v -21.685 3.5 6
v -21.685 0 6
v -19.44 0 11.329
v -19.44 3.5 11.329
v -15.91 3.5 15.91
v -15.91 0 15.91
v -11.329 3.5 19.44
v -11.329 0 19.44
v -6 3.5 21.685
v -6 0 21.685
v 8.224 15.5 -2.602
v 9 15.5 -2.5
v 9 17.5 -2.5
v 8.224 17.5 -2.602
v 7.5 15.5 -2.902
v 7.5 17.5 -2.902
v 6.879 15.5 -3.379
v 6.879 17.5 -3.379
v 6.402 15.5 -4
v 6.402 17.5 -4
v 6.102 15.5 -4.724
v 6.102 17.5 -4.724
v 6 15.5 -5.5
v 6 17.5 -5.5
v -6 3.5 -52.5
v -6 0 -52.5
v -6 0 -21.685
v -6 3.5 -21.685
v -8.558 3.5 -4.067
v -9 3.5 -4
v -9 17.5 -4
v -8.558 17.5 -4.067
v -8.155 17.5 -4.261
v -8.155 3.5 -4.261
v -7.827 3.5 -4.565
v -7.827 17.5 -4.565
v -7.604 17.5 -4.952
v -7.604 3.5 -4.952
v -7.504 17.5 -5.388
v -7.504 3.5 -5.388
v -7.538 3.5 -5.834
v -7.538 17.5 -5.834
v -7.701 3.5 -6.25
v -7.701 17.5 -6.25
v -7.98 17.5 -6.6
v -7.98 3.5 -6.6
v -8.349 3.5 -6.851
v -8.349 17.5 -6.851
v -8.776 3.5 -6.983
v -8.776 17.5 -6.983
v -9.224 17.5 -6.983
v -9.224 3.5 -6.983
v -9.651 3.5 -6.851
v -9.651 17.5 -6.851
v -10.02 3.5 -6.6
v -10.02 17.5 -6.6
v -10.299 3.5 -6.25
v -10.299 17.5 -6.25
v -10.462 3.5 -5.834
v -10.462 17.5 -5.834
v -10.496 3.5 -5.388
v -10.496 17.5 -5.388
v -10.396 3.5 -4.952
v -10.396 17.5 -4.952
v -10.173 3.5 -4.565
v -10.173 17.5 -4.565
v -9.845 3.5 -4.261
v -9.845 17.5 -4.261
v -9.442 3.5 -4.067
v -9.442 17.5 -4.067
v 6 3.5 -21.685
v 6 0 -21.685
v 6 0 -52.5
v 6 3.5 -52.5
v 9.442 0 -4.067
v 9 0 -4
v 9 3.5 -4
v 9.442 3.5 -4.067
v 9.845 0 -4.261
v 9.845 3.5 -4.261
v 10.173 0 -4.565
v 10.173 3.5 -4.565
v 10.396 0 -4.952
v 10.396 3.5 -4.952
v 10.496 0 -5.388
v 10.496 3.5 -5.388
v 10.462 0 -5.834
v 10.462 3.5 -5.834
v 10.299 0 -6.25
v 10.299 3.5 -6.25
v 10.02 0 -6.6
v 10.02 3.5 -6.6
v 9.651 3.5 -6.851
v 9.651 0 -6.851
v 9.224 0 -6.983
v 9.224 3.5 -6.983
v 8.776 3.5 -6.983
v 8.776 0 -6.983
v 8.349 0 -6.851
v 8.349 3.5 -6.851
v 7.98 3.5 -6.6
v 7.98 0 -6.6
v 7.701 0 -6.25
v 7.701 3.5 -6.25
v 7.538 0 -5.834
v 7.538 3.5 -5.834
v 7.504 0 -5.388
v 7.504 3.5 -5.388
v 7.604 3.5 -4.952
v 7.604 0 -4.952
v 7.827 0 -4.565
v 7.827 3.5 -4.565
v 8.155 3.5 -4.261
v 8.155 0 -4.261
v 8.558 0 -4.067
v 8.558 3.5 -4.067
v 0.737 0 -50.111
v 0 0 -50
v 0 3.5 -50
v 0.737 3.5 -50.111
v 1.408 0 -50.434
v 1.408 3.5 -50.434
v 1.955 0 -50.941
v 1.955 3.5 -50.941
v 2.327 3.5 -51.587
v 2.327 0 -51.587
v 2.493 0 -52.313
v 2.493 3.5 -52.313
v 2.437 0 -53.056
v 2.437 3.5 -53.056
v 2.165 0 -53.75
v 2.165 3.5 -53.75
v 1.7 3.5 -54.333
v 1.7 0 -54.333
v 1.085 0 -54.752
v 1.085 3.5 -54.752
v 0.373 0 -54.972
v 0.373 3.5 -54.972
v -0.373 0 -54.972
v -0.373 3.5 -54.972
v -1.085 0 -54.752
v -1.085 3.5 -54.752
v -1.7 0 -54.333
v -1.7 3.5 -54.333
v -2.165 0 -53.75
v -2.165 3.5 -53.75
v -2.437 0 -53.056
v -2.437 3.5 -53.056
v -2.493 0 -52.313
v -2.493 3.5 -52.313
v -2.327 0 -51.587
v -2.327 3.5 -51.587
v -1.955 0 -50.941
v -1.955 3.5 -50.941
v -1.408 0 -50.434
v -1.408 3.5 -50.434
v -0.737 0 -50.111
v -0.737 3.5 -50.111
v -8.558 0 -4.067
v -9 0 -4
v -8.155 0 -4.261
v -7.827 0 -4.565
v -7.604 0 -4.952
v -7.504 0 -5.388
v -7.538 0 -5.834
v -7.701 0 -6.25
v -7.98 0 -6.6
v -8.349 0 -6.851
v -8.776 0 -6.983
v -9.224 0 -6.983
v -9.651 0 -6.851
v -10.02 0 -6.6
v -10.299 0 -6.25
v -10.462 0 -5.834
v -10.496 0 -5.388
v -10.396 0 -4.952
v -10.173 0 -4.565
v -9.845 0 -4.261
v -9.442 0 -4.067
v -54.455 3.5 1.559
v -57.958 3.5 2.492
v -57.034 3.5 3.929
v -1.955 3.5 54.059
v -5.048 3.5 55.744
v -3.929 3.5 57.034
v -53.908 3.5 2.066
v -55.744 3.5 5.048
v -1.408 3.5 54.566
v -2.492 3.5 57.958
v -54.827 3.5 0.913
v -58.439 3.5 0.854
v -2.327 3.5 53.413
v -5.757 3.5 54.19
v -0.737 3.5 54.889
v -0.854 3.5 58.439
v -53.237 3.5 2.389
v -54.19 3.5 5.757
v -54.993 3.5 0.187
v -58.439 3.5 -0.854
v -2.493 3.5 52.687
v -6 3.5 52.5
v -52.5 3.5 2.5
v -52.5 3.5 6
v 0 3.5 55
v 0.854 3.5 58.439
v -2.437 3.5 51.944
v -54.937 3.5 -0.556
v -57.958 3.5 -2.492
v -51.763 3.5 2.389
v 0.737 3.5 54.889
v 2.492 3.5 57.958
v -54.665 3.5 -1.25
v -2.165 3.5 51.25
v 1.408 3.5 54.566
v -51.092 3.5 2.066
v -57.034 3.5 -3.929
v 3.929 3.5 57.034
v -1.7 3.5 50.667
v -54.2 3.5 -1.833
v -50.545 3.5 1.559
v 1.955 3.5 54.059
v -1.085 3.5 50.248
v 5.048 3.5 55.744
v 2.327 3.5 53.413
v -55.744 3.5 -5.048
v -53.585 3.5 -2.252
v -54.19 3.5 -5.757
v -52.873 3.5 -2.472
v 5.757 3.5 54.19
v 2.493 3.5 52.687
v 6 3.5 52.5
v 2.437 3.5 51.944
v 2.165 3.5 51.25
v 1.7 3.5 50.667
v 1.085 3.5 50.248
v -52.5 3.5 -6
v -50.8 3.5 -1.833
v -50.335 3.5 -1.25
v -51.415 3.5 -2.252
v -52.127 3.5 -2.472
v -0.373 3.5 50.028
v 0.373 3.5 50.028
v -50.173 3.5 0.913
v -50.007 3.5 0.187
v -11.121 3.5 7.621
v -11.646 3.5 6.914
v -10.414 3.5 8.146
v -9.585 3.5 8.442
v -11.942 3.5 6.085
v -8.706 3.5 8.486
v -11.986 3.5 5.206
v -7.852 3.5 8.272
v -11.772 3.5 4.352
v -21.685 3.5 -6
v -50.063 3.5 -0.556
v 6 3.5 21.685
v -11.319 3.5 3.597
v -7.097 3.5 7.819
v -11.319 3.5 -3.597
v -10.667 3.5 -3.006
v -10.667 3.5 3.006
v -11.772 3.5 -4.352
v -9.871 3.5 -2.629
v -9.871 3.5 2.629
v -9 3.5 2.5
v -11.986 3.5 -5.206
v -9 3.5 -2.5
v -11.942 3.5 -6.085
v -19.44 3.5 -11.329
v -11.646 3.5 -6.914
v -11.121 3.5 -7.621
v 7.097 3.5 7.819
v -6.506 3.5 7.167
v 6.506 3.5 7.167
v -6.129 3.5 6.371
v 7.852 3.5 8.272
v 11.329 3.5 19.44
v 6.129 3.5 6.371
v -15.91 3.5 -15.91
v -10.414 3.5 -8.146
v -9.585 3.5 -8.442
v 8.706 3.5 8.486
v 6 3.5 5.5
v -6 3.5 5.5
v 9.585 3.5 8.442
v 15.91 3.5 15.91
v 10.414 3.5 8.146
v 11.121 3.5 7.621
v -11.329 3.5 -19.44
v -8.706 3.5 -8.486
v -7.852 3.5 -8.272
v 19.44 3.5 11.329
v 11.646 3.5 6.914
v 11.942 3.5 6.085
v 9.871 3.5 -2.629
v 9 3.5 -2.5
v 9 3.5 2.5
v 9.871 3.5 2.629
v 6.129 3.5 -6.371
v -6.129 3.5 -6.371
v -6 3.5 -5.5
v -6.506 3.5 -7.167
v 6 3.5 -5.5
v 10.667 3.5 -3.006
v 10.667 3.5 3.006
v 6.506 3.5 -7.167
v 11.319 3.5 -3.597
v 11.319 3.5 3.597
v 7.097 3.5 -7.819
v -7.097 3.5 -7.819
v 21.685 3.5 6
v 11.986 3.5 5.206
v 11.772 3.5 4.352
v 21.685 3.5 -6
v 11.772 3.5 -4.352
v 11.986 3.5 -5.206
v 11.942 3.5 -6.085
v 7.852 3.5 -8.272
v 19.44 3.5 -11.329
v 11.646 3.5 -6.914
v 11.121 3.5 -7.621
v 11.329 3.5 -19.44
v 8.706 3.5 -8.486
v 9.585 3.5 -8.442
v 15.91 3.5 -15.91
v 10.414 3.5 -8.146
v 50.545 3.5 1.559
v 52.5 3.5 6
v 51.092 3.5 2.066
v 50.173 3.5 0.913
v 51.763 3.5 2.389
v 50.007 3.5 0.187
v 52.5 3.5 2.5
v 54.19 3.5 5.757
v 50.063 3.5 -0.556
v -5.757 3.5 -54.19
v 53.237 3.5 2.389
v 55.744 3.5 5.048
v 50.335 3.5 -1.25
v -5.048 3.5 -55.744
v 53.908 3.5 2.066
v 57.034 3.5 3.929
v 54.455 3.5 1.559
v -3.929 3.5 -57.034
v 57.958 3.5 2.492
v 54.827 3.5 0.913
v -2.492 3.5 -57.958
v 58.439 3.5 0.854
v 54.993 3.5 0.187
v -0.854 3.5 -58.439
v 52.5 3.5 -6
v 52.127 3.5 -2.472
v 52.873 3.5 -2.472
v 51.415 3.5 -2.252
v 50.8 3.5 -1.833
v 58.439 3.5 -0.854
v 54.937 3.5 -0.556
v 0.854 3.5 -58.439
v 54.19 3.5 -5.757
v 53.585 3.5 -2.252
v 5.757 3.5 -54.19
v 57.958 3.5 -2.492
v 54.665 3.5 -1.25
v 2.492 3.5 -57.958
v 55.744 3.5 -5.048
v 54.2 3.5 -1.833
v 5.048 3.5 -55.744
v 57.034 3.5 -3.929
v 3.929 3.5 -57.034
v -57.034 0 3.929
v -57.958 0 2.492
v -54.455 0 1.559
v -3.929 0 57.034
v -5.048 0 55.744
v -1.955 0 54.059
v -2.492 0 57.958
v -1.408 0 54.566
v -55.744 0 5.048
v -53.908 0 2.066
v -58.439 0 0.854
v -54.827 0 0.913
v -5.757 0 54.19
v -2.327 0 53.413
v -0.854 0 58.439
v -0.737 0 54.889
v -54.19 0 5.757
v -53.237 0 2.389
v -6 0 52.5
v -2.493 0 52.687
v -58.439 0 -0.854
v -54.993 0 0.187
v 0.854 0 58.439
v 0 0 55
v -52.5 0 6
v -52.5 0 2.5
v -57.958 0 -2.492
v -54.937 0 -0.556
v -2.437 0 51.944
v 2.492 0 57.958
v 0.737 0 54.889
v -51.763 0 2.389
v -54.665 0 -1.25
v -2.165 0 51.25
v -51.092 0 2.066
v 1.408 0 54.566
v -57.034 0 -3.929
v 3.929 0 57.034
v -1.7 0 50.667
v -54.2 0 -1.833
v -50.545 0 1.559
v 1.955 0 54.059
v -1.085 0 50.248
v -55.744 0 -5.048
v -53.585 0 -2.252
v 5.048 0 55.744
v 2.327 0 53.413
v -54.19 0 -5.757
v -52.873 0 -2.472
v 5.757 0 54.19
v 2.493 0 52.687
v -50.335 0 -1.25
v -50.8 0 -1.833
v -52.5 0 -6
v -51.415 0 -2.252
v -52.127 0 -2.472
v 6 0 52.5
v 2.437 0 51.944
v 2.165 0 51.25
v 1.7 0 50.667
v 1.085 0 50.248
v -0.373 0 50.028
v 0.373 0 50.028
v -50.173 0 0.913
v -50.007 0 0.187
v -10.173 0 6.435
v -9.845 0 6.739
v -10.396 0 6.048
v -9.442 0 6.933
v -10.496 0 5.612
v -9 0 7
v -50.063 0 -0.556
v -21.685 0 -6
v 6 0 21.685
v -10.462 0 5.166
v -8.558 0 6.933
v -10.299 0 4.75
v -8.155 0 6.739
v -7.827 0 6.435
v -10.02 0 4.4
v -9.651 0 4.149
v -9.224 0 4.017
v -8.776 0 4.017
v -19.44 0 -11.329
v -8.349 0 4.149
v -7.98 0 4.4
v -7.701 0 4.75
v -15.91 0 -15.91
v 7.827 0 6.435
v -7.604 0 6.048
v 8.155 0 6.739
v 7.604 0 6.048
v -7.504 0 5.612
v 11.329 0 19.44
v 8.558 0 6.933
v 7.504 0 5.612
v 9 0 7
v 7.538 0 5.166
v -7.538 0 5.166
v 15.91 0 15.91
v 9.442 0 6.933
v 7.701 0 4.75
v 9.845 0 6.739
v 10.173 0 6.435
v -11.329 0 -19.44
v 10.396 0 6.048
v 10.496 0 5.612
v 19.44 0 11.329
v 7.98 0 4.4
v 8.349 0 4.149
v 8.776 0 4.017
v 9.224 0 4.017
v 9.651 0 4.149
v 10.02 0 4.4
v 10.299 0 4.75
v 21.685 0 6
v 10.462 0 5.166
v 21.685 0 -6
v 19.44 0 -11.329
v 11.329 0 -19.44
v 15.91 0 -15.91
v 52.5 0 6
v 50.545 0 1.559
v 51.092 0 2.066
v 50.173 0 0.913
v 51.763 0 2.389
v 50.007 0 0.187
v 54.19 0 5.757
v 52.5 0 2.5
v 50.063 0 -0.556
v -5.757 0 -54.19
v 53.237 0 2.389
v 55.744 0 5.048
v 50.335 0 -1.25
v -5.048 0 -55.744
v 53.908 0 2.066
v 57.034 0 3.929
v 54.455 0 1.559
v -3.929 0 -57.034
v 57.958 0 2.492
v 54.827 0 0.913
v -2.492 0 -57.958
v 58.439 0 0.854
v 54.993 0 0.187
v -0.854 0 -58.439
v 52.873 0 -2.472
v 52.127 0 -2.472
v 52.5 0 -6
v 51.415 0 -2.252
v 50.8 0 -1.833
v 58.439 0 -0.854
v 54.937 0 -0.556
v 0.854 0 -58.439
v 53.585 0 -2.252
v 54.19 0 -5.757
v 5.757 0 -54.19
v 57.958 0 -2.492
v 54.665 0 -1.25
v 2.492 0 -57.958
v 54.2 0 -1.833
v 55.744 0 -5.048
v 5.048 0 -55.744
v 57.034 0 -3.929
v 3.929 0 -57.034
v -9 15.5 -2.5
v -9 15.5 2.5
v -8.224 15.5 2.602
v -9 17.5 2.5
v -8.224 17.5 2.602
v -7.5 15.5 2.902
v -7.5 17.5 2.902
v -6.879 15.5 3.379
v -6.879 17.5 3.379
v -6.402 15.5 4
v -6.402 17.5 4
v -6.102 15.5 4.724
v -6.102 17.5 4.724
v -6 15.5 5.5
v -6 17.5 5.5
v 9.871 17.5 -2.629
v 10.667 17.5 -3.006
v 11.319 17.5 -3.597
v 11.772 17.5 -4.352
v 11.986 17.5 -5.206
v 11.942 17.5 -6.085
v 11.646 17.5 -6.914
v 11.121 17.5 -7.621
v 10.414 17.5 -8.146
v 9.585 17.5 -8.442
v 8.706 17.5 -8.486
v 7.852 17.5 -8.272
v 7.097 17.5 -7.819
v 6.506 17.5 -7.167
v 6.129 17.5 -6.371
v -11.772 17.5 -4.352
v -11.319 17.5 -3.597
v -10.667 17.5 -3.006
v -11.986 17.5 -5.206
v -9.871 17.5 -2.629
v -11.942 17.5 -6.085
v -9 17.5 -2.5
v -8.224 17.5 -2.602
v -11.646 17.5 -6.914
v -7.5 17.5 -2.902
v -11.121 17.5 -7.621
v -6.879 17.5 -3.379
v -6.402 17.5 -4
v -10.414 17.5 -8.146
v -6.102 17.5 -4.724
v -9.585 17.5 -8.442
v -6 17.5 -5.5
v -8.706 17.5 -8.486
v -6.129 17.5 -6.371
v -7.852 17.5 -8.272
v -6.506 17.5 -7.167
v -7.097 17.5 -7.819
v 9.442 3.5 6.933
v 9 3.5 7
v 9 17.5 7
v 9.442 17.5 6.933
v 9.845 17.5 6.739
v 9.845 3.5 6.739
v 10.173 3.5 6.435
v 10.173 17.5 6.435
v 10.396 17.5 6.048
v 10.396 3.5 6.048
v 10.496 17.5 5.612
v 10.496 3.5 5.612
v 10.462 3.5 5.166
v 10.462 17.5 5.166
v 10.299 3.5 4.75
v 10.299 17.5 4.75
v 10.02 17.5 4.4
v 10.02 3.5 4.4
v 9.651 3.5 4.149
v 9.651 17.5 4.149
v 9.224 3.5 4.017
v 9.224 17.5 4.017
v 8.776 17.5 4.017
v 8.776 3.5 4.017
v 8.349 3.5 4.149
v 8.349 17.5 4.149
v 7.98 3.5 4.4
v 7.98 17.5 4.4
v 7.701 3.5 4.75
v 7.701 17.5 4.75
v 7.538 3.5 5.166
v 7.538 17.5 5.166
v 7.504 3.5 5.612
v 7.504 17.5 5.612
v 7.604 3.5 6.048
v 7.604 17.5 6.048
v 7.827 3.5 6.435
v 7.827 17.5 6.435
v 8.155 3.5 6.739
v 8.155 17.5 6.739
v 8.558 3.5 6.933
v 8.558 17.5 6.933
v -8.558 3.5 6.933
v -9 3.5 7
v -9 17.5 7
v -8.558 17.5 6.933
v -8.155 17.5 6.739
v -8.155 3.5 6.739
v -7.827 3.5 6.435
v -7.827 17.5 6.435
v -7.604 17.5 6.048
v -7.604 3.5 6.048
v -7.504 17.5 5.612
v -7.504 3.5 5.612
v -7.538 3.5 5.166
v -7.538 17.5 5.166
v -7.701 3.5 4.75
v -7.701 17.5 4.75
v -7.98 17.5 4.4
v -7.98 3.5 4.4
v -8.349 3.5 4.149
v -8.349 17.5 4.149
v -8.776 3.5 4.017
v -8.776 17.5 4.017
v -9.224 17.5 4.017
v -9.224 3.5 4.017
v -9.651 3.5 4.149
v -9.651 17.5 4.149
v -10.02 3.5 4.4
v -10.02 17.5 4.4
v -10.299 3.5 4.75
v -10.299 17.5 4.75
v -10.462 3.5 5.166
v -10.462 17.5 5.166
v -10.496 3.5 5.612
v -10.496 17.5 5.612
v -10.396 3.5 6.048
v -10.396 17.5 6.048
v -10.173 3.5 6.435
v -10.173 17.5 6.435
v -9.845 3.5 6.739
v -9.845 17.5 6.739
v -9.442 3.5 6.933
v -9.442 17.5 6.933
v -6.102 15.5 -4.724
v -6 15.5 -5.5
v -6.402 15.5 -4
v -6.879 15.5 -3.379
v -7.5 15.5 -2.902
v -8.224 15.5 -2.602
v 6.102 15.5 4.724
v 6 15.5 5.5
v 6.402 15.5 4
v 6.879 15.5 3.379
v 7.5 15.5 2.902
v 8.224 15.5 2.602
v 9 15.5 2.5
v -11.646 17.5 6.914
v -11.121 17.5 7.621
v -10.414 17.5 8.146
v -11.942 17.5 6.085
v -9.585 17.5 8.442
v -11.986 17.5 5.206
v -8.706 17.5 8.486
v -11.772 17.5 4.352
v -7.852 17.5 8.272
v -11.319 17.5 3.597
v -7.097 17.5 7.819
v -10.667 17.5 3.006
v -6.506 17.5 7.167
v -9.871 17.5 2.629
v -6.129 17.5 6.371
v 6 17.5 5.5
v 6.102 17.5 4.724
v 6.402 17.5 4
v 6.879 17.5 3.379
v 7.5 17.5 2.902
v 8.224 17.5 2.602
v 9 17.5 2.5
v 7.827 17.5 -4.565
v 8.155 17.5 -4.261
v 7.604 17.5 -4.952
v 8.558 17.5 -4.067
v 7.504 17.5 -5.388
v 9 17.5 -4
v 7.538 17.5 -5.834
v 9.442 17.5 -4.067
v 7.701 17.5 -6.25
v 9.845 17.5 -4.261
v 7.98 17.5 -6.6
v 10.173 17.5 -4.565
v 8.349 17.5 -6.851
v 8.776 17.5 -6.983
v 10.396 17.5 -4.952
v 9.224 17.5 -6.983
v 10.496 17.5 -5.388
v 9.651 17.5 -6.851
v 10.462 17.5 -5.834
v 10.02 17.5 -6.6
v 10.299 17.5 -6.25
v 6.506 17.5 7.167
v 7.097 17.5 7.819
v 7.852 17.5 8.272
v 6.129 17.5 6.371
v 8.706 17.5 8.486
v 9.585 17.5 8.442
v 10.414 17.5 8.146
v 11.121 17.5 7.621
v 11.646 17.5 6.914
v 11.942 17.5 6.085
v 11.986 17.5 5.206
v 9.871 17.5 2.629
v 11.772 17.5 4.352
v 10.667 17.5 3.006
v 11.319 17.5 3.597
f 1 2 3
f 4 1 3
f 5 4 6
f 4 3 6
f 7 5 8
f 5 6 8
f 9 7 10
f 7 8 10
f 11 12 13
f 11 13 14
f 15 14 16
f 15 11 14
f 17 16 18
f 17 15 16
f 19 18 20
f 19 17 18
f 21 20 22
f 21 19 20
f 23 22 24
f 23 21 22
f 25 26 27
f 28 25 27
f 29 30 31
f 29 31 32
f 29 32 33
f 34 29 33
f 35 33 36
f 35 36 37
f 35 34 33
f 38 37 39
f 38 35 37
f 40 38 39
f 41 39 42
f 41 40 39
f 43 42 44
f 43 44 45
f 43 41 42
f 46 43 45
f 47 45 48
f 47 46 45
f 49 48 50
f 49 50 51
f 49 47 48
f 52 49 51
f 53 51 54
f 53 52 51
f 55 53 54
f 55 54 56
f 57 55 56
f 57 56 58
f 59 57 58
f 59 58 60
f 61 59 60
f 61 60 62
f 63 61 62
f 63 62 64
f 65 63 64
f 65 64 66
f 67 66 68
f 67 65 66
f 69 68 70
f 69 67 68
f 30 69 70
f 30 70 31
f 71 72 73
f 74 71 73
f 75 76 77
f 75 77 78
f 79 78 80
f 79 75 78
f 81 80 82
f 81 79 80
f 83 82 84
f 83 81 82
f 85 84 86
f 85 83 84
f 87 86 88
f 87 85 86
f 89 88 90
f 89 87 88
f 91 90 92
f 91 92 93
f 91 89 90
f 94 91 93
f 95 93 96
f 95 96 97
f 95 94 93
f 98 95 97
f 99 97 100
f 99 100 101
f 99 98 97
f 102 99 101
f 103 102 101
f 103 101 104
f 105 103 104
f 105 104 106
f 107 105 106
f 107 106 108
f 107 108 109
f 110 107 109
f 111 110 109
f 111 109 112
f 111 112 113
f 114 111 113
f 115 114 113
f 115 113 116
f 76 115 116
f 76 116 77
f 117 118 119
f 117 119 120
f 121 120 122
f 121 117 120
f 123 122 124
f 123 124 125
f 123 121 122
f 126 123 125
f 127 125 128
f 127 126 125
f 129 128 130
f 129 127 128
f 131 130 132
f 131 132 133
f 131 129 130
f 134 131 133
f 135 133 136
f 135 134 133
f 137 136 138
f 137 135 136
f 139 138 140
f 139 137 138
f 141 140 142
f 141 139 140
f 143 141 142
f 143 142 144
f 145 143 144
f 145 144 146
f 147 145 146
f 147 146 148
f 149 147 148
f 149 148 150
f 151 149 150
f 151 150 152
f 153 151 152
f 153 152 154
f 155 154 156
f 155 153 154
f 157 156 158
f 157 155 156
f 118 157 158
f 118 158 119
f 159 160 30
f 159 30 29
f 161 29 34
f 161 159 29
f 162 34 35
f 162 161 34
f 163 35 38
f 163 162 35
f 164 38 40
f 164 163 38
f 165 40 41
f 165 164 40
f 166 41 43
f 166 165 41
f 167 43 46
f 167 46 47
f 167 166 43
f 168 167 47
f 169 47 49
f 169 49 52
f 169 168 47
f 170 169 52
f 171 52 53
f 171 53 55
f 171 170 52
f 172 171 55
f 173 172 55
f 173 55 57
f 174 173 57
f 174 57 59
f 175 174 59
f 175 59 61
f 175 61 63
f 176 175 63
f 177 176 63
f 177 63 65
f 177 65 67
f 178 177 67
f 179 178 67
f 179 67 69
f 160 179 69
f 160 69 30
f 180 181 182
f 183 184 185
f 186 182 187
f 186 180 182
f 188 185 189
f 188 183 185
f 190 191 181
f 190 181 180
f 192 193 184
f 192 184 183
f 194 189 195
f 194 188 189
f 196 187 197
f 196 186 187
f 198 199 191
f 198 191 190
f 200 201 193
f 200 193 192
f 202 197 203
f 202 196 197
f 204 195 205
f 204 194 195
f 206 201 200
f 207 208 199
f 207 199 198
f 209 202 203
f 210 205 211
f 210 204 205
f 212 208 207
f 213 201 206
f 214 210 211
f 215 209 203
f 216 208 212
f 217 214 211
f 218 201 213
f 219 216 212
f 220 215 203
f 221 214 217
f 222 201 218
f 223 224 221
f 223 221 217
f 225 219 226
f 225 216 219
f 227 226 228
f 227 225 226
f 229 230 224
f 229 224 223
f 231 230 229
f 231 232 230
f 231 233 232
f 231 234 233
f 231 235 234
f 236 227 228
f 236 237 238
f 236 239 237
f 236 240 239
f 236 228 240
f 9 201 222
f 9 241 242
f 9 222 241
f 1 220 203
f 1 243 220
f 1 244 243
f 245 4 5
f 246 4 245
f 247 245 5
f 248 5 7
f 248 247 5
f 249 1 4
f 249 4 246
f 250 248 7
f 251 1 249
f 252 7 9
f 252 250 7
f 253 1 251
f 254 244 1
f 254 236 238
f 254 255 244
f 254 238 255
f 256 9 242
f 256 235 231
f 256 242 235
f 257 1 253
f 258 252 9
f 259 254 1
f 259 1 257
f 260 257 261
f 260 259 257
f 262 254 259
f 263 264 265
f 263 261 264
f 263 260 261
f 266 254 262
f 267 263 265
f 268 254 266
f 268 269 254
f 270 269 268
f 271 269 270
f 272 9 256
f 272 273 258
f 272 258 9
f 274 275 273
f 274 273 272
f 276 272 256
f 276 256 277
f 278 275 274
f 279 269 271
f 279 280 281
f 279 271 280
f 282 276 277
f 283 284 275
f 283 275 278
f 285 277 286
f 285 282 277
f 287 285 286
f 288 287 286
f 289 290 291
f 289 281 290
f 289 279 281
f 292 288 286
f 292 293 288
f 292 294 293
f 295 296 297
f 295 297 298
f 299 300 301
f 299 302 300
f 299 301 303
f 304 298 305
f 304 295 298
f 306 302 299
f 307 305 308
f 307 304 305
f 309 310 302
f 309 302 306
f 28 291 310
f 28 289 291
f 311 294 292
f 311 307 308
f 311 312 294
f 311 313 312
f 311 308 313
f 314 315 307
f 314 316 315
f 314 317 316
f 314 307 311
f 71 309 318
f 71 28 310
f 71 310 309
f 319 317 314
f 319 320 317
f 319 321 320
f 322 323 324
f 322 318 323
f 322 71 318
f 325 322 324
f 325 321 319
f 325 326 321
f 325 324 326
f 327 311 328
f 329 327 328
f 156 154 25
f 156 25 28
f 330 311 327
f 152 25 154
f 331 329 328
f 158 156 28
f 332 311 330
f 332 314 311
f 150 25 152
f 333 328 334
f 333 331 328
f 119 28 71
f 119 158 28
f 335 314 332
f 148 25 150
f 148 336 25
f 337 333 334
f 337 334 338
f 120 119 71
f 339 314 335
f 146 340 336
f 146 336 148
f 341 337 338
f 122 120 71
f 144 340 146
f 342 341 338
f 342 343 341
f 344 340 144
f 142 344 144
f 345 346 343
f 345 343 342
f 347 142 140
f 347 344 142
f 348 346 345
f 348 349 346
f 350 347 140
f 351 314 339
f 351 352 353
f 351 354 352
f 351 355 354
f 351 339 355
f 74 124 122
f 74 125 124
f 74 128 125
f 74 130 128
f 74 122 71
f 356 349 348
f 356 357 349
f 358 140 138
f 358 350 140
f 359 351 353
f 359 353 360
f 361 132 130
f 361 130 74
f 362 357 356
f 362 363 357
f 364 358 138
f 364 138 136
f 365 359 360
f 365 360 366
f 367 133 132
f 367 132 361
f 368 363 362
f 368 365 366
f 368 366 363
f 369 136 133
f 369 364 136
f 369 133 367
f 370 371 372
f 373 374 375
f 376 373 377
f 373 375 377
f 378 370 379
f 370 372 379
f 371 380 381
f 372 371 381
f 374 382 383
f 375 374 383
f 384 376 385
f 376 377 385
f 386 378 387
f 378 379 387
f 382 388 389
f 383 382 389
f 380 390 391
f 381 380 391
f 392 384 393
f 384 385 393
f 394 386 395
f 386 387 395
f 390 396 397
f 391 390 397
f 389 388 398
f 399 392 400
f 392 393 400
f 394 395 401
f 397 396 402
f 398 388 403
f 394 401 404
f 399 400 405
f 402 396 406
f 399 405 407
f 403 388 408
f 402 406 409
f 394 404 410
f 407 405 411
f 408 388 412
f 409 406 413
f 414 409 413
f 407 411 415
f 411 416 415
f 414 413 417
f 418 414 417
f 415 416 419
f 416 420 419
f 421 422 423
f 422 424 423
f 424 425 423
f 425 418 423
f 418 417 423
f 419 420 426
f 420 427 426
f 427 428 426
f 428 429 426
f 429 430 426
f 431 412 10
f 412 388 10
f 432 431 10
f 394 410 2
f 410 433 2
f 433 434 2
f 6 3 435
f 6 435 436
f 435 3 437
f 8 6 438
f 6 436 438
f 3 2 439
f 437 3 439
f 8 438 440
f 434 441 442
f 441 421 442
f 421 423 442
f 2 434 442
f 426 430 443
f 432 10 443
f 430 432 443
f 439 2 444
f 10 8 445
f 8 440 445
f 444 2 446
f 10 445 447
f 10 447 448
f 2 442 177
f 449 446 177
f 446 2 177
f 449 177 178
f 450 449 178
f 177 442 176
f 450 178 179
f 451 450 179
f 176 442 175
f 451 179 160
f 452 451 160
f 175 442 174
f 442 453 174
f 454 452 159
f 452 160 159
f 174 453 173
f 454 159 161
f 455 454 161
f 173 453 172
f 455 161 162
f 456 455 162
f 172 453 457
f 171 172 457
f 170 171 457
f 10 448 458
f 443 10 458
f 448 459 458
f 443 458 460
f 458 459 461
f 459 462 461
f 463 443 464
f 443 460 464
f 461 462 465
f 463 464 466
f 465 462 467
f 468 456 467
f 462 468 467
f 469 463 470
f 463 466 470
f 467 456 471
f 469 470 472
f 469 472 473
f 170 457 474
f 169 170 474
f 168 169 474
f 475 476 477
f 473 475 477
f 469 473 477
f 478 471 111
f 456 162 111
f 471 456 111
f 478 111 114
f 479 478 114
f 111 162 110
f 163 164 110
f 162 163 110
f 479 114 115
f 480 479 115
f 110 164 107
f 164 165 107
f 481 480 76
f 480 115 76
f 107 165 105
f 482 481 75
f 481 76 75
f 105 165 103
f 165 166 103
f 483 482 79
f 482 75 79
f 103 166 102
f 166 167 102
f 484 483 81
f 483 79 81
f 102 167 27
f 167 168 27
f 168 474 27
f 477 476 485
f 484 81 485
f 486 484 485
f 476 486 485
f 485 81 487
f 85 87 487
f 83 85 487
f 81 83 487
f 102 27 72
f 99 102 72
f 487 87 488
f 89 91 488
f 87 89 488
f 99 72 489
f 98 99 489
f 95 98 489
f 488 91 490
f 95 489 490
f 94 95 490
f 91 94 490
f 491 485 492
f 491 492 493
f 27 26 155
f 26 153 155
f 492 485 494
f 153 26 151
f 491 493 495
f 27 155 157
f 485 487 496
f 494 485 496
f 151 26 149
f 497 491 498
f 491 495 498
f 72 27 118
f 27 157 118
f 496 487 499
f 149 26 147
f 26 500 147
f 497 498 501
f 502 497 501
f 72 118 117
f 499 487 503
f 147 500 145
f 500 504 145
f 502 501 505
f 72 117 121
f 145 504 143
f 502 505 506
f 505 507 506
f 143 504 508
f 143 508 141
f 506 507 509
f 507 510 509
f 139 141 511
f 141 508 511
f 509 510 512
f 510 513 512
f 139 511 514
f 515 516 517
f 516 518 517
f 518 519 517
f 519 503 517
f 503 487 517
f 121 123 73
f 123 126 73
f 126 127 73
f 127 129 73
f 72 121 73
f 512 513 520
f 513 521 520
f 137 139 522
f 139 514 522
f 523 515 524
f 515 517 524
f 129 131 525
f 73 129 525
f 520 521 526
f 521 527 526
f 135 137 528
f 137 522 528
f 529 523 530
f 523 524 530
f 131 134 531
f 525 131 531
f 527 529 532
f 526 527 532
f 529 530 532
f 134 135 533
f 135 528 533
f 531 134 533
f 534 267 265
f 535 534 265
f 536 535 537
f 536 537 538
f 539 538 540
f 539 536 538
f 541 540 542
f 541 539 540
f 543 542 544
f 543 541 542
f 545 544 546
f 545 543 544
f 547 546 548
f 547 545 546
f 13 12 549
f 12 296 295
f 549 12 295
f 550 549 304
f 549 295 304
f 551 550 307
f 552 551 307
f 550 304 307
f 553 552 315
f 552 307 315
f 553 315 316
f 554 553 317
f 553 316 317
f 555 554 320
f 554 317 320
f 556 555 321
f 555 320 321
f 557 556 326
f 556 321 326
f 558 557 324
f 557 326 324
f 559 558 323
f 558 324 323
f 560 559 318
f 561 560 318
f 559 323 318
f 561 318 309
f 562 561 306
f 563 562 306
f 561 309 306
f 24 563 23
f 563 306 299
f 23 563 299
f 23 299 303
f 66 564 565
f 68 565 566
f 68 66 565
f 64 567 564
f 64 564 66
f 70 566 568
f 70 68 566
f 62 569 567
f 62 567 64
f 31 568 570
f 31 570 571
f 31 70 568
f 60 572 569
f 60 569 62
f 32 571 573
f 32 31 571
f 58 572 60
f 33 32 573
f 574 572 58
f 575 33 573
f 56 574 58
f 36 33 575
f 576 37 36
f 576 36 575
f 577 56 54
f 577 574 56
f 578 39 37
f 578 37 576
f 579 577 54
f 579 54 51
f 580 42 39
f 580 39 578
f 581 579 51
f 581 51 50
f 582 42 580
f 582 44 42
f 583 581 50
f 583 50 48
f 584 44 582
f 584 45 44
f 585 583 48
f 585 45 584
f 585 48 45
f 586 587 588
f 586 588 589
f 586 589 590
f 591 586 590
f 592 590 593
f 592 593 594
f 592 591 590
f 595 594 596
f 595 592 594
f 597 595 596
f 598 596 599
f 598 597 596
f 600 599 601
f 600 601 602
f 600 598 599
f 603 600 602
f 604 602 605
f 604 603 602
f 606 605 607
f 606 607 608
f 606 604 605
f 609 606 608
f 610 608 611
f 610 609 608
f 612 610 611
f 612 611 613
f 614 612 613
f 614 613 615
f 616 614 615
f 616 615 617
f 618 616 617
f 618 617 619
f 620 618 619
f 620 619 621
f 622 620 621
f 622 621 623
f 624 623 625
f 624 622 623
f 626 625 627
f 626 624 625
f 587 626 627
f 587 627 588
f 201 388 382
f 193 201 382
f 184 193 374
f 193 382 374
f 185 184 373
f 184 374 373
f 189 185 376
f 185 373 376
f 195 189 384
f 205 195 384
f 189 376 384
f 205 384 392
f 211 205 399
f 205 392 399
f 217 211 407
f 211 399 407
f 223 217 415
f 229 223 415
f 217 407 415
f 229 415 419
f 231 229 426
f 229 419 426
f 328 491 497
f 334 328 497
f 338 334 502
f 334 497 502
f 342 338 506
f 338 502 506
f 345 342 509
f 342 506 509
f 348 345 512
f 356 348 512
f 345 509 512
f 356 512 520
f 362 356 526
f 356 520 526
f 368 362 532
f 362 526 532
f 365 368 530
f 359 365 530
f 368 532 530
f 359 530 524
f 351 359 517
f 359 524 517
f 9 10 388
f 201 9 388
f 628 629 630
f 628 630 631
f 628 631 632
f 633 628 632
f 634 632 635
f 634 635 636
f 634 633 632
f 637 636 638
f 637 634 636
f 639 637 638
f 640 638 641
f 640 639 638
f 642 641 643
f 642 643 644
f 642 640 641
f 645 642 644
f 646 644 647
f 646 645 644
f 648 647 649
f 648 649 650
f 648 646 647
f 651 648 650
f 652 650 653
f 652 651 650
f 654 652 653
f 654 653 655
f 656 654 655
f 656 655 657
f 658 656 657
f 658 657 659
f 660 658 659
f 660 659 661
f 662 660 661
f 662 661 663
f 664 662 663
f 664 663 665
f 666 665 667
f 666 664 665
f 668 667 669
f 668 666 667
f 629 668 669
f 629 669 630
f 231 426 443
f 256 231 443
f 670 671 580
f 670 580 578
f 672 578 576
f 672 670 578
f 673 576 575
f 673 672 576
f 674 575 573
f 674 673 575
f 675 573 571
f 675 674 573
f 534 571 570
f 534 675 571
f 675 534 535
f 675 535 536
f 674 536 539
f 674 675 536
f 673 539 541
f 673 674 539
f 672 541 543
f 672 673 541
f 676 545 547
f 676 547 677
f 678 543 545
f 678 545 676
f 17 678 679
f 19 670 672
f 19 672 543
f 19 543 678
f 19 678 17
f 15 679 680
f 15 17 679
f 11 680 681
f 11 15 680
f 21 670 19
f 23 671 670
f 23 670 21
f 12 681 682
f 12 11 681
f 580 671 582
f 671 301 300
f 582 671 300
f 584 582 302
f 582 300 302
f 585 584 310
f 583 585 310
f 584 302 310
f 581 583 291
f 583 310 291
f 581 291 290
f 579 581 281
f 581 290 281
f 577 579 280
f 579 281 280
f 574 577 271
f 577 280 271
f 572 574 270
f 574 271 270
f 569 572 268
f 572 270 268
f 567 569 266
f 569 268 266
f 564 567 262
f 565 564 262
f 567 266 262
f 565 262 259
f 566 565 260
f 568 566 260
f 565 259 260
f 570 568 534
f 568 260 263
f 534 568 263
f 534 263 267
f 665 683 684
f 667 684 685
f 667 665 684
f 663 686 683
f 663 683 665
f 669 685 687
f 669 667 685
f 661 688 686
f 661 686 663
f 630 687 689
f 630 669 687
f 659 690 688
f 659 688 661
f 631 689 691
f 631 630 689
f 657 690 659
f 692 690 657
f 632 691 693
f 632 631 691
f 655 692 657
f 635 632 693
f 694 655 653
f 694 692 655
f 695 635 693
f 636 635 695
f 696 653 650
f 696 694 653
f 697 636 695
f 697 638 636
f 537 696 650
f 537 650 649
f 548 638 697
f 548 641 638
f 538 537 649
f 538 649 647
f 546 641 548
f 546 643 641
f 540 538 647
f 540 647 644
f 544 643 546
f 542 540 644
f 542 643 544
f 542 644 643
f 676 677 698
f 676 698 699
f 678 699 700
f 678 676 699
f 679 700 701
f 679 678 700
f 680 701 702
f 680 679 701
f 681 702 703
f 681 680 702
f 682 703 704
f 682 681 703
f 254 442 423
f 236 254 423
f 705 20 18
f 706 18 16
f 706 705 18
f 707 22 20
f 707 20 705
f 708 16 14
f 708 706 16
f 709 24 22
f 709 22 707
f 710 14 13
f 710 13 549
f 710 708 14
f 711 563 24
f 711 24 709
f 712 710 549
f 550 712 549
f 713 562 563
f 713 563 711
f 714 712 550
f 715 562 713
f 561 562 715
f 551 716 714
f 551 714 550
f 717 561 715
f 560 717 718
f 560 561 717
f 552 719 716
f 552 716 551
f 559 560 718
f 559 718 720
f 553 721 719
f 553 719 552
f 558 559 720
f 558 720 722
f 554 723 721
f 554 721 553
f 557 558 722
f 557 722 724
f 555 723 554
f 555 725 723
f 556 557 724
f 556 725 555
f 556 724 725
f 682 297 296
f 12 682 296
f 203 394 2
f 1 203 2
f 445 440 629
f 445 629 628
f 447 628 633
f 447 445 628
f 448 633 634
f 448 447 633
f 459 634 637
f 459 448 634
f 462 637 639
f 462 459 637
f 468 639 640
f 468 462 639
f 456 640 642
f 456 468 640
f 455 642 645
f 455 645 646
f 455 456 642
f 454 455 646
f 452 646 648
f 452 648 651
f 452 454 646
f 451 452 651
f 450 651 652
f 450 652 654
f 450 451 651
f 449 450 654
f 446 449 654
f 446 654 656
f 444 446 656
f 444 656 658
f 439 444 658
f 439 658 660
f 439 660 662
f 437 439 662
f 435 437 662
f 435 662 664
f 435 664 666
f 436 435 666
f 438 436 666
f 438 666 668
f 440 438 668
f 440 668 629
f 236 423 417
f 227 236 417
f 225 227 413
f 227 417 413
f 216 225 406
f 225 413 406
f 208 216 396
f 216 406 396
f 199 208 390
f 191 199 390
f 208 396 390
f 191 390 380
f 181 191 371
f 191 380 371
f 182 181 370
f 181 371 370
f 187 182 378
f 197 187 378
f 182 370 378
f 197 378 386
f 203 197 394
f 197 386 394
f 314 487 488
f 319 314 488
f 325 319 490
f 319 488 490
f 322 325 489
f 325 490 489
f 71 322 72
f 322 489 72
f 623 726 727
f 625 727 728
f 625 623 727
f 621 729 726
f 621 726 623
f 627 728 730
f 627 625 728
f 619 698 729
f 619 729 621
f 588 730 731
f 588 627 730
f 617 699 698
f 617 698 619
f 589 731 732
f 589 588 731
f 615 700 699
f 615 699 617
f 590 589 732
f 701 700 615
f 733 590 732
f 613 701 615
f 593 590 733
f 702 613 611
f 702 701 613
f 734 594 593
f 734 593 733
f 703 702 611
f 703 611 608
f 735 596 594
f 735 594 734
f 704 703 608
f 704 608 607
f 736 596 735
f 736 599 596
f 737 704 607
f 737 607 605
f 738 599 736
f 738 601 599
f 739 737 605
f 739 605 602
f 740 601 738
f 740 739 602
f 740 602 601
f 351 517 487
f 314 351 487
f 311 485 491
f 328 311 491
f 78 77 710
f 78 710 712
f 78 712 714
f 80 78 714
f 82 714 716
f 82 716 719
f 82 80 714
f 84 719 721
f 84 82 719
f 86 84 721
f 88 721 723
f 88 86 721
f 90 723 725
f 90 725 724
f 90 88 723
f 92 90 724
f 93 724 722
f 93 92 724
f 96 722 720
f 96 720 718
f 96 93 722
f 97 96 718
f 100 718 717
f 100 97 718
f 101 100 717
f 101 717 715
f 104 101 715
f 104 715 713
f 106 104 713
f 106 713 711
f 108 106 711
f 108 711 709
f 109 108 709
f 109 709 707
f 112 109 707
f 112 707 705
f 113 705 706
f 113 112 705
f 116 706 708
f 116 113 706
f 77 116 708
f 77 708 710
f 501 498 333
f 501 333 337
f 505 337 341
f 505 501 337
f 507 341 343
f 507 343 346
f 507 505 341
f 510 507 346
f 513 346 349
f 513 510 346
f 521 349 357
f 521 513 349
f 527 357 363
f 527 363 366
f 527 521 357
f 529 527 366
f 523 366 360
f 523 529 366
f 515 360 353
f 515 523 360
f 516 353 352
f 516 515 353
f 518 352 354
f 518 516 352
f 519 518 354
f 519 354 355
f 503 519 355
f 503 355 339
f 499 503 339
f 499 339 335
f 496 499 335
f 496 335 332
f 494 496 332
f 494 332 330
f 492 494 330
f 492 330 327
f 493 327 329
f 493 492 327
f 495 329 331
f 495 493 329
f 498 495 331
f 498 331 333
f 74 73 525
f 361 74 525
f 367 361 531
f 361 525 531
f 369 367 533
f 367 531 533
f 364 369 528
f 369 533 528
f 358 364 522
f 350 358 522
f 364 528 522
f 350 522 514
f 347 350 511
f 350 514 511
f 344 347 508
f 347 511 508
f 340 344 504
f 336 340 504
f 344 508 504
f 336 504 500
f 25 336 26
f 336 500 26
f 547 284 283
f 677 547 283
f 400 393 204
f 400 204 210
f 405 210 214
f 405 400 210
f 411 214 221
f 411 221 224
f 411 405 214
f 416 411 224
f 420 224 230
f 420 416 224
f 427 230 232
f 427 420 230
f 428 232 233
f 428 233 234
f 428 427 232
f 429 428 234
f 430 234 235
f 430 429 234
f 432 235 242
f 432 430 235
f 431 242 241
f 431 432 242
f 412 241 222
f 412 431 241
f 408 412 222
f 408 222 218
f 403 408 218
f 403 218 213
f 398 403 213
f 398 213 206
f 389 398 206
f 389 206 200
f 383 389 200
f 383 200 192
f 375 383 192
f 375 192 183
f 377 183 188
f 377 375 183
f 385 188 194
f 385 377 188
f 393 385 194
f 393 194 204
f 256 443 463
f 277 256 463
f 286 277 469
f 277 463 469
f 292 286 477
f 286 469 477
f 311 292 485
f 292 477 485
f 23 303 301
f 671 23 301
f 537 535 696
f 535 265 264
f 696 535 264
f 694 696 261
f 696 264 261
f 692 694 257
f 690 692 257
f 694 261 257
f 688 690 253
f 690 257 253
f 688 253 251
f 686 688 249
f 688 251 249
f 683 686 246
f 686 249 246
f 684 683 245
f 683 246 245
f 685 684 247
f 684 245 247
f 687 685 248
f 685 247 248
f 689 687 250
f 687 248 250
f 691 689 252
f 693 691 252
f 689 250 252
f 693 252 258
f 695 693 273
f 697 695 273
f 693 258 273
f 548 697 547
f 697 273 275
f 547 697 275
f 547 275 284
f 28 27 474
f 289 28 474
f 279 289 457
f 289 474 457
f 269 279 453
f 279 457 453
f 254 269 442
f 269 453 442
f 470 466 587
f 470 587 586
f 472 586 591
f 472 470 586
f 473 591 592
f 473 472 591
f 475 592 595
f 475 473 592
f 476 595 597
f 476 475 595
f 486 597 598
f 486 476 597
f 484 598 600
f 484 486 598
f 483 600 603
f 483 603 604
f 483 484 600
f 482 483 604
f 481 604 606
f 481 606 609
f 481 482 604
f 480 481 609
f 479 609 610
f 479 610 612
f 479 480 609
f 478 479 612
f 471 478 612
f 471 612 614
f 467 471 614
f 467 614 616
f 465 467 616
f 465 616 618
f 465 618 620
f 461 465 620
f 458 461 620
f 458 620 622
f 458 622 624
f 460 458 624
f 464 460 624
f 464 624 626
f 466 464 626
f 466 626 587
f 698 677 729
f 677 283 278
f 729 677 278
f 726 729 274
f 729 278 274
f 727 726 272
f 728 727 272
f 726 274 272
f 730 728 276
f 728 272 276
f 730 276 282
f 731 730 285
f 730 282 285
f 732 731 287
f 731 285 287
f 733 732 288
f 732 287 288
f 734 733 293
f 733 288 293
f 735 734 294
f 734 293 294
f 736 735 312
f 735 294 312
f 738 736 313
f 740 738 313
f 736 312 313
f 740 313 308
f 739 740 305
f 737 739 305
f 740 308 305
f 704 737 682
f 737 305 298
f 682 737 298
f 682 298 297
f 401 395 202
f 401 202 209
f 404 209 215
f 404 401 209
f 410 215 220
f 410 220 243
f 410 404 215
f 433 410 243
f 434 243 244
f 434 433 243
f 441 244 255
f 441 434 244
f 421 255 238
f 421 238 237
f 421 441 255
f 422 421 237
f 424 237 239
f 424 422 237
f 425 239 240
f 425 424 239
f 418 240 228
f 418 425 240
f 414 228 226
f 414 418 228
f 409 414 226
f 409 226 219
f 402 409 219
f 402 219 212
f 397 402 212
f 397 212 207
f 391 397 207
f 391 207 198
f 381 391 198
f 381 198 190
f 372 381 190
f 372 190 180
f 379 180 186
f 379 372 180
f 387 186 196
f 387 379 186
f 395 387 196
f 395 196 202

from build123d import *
from build123d.topology import SkipClean

# Parameters (mm, degrees)
SKETCH1_R           = 2.5
BOSS_EXTRUDE1_DEPTH = 3.5
SKETCH4_R           = 1.5
BOSS_EXTRUDE2_DEPTH = 14
CUT_EXTRUDE4_START  = -2
CUT_EXTRUDE4_DEPTH  = 2
CUT_EXTRUDE2_START  = -10
SKETCH4_2_R         = 1.5
CUT_EXTRUDE2_DEPTH  = 10


with BuildPart() as part:
    # Sketch1 → Boss-Extrude1 (new body)
    with BuildSketch(Plane(origin=(0, 0, 0), x_dir=(1, 0, 0), z_dir=(0, 1, 0))):
        with BuildLine():
            Line((-21.685248442, 6), (-52.5, 6))
            ThreePointArc((-52.5, 6), (-58.5, 0), (-52.5, -6))
            Line((-52.5, -6), (-21.685248442, -6))
            ThreePointArc((-21.685248442, -6), (-15.909902577, -15.909902577), (-6, -21.685248442))
            Line((-6, -21.685248442), (-6, -52.5))
            ThreePointArc((-6, -52.5), (0, -58.5), (6, -52.5))
            Line((6, -52.5), (6, -21.685248442))
            ThreePointArc((6, -21.685248442), (15.909902577, -15.909902577), (21.685248442, -6))
            Line((21.685248442, -6), (52.5, -6))
            ThreePointArc((52.5, -6), (58.5, 0), (52.5, 6))
            Line((52.5, 6), (21.685248442, 6))
            ThreePointArc((21.685248442, 6), (15.909902577, 15.909902577), (6, 21.685248442))
            Line((6, 21.685248442), (6, 52.5))
            ThreePointArc((6, 52.5), (0, 58.5), (-6, 52.5))
            Line((-6, 52.5), (-6, 21.685248442))
            ThreePointArc((-6, 21.685248442), (-15.909902577, 15.909902577), (-21.685248442, 6))
        make_face()
        with Locations((0, -52.5)):
            Circle(SKETCH1_R, mode=Mode.SUBTRACT)
        with Locations((52.5, 0)):
            Circle(SKETCH1_R, mode=Mode.SUBTRACT)
        with Locations((-52.5, 0)):
            Circle(SKETCH1_R, mode=Mode.SUBTRACT)
        with Locations((0, 52.5)):
            Circle(SKETCH1_R, mode=Mode.SUBTRACT)
    extrude(amount=BOSS_EXTRUDE1_DEPTH)

    # Sketch4 → Boss-Extrude2 (add)
    with BuildSketch(Plane(origin=(0, 3.5, 0), x_dir=(1, 0, 0), z_dir=(0, 1, 0))):
        with BuildLine():
            Line((-6, -5.5), (6, -5.5))
            ThreePointArc((6, -5.5), (11.121320344, -7.621320344), (9, -2.5))
            Line((9, -2.5), (9, 2.5))
            ThreePointArc((9, 2.5), (11.121320344, 7.621320344), (6, 5.5))
            Line((6, 5.5), (-6, 5.5))
            ThreePointArc((-6, 5.5), (-11.121320344, 7.621320344), (-9, 2.5))
            Line((-9, 2.5), (-9, -2.5))
            ThreePointArc((-9, -2.5), (-11.121320344, -7.621320344), (-6, -5.5))
        make_face()
        with Locations((9, -5.5)):
            Circle(SKETCH4_R, mode=Mode.SUBTRACT)
        with Locations((-9, -5.5)):
            Circle(SKETCH4_R, mode=Mode.SUBTRACT)
        with Locations((-9, 5.5)):
            Circle(SKETCH4_R, mode=Mode.SUBTRACT)
        with Locations((9, 5.5)):
            Circle(SKETCH4_R, mode=Mode.SUBTRACT)
    extrude(amount=BOSS_EXTRUDE2_DEPTH)

    # Sketch6 → Cut-Extrude4 (cut)
    with SkipClean():  # the faces are left unmerged after this step: merging them gives an invalid solid
        with BuildSketch(Plane(origin=(0, 17.5, 0), x_dir=(1, 0, 0), z_dir=(0, 1, 0)).offset(CUT_EXTRUDE4_START)):
            with BuildLine():
                ThreePointArc((9, 2.5), (6.878679656, 3.378679656), (6, 5.5))
                Line((6, 5.5), (-6, 5.5))
                ThreePointArc((-6, 5.5), (-6.878679656, 3.378679656), (-9, 2.5))
                Line((-9, 2.5), (-9, -2.5))
                ThreePointArc((-9, -2.5), (-6.878679656, -3.378679656), (-6, -5.5))
                Line((-6, -5.5), (6, -5.5))
                ThreePointArc((6, -5.5), (6.878679656, -3.378679656), (9, -2.5))
                Line((9, -2.5), (9, 2.5))
            make_face()
        extrude(amount=CUT_EXTRUDE4_DEPTH, mode=Mode.SUBTRACT)

    # Sketch4<2> → Cut-Extrude2 (cut)
    with SkipClean():  # the faces are left unmerged after this step: merging them gives an invalid solid
        with BuildSketch(Plane(origin=(0, 3.5, 0), x_dir=(1, 0, 0), z_dir=(0, 1, 0)).offset(CUT_EXTRUDE2_START)):
            with Locations((9, -5.5)):
                Circle(SKETCH4_2_R)
            with Locations((-9, -5.5)):
                Circle(SKETCH4_2_R)
            with Locations((-9, 5.5)):
                Circle(SKETCH4_2_R)
            with Locations((9, 5.5)):
                Circle(SKETCH4_2_R)
        extrude(amount=CUT_EXTRUDE2_DEPTH, mode=Mode.SUBTRACT)


solid = part.part
